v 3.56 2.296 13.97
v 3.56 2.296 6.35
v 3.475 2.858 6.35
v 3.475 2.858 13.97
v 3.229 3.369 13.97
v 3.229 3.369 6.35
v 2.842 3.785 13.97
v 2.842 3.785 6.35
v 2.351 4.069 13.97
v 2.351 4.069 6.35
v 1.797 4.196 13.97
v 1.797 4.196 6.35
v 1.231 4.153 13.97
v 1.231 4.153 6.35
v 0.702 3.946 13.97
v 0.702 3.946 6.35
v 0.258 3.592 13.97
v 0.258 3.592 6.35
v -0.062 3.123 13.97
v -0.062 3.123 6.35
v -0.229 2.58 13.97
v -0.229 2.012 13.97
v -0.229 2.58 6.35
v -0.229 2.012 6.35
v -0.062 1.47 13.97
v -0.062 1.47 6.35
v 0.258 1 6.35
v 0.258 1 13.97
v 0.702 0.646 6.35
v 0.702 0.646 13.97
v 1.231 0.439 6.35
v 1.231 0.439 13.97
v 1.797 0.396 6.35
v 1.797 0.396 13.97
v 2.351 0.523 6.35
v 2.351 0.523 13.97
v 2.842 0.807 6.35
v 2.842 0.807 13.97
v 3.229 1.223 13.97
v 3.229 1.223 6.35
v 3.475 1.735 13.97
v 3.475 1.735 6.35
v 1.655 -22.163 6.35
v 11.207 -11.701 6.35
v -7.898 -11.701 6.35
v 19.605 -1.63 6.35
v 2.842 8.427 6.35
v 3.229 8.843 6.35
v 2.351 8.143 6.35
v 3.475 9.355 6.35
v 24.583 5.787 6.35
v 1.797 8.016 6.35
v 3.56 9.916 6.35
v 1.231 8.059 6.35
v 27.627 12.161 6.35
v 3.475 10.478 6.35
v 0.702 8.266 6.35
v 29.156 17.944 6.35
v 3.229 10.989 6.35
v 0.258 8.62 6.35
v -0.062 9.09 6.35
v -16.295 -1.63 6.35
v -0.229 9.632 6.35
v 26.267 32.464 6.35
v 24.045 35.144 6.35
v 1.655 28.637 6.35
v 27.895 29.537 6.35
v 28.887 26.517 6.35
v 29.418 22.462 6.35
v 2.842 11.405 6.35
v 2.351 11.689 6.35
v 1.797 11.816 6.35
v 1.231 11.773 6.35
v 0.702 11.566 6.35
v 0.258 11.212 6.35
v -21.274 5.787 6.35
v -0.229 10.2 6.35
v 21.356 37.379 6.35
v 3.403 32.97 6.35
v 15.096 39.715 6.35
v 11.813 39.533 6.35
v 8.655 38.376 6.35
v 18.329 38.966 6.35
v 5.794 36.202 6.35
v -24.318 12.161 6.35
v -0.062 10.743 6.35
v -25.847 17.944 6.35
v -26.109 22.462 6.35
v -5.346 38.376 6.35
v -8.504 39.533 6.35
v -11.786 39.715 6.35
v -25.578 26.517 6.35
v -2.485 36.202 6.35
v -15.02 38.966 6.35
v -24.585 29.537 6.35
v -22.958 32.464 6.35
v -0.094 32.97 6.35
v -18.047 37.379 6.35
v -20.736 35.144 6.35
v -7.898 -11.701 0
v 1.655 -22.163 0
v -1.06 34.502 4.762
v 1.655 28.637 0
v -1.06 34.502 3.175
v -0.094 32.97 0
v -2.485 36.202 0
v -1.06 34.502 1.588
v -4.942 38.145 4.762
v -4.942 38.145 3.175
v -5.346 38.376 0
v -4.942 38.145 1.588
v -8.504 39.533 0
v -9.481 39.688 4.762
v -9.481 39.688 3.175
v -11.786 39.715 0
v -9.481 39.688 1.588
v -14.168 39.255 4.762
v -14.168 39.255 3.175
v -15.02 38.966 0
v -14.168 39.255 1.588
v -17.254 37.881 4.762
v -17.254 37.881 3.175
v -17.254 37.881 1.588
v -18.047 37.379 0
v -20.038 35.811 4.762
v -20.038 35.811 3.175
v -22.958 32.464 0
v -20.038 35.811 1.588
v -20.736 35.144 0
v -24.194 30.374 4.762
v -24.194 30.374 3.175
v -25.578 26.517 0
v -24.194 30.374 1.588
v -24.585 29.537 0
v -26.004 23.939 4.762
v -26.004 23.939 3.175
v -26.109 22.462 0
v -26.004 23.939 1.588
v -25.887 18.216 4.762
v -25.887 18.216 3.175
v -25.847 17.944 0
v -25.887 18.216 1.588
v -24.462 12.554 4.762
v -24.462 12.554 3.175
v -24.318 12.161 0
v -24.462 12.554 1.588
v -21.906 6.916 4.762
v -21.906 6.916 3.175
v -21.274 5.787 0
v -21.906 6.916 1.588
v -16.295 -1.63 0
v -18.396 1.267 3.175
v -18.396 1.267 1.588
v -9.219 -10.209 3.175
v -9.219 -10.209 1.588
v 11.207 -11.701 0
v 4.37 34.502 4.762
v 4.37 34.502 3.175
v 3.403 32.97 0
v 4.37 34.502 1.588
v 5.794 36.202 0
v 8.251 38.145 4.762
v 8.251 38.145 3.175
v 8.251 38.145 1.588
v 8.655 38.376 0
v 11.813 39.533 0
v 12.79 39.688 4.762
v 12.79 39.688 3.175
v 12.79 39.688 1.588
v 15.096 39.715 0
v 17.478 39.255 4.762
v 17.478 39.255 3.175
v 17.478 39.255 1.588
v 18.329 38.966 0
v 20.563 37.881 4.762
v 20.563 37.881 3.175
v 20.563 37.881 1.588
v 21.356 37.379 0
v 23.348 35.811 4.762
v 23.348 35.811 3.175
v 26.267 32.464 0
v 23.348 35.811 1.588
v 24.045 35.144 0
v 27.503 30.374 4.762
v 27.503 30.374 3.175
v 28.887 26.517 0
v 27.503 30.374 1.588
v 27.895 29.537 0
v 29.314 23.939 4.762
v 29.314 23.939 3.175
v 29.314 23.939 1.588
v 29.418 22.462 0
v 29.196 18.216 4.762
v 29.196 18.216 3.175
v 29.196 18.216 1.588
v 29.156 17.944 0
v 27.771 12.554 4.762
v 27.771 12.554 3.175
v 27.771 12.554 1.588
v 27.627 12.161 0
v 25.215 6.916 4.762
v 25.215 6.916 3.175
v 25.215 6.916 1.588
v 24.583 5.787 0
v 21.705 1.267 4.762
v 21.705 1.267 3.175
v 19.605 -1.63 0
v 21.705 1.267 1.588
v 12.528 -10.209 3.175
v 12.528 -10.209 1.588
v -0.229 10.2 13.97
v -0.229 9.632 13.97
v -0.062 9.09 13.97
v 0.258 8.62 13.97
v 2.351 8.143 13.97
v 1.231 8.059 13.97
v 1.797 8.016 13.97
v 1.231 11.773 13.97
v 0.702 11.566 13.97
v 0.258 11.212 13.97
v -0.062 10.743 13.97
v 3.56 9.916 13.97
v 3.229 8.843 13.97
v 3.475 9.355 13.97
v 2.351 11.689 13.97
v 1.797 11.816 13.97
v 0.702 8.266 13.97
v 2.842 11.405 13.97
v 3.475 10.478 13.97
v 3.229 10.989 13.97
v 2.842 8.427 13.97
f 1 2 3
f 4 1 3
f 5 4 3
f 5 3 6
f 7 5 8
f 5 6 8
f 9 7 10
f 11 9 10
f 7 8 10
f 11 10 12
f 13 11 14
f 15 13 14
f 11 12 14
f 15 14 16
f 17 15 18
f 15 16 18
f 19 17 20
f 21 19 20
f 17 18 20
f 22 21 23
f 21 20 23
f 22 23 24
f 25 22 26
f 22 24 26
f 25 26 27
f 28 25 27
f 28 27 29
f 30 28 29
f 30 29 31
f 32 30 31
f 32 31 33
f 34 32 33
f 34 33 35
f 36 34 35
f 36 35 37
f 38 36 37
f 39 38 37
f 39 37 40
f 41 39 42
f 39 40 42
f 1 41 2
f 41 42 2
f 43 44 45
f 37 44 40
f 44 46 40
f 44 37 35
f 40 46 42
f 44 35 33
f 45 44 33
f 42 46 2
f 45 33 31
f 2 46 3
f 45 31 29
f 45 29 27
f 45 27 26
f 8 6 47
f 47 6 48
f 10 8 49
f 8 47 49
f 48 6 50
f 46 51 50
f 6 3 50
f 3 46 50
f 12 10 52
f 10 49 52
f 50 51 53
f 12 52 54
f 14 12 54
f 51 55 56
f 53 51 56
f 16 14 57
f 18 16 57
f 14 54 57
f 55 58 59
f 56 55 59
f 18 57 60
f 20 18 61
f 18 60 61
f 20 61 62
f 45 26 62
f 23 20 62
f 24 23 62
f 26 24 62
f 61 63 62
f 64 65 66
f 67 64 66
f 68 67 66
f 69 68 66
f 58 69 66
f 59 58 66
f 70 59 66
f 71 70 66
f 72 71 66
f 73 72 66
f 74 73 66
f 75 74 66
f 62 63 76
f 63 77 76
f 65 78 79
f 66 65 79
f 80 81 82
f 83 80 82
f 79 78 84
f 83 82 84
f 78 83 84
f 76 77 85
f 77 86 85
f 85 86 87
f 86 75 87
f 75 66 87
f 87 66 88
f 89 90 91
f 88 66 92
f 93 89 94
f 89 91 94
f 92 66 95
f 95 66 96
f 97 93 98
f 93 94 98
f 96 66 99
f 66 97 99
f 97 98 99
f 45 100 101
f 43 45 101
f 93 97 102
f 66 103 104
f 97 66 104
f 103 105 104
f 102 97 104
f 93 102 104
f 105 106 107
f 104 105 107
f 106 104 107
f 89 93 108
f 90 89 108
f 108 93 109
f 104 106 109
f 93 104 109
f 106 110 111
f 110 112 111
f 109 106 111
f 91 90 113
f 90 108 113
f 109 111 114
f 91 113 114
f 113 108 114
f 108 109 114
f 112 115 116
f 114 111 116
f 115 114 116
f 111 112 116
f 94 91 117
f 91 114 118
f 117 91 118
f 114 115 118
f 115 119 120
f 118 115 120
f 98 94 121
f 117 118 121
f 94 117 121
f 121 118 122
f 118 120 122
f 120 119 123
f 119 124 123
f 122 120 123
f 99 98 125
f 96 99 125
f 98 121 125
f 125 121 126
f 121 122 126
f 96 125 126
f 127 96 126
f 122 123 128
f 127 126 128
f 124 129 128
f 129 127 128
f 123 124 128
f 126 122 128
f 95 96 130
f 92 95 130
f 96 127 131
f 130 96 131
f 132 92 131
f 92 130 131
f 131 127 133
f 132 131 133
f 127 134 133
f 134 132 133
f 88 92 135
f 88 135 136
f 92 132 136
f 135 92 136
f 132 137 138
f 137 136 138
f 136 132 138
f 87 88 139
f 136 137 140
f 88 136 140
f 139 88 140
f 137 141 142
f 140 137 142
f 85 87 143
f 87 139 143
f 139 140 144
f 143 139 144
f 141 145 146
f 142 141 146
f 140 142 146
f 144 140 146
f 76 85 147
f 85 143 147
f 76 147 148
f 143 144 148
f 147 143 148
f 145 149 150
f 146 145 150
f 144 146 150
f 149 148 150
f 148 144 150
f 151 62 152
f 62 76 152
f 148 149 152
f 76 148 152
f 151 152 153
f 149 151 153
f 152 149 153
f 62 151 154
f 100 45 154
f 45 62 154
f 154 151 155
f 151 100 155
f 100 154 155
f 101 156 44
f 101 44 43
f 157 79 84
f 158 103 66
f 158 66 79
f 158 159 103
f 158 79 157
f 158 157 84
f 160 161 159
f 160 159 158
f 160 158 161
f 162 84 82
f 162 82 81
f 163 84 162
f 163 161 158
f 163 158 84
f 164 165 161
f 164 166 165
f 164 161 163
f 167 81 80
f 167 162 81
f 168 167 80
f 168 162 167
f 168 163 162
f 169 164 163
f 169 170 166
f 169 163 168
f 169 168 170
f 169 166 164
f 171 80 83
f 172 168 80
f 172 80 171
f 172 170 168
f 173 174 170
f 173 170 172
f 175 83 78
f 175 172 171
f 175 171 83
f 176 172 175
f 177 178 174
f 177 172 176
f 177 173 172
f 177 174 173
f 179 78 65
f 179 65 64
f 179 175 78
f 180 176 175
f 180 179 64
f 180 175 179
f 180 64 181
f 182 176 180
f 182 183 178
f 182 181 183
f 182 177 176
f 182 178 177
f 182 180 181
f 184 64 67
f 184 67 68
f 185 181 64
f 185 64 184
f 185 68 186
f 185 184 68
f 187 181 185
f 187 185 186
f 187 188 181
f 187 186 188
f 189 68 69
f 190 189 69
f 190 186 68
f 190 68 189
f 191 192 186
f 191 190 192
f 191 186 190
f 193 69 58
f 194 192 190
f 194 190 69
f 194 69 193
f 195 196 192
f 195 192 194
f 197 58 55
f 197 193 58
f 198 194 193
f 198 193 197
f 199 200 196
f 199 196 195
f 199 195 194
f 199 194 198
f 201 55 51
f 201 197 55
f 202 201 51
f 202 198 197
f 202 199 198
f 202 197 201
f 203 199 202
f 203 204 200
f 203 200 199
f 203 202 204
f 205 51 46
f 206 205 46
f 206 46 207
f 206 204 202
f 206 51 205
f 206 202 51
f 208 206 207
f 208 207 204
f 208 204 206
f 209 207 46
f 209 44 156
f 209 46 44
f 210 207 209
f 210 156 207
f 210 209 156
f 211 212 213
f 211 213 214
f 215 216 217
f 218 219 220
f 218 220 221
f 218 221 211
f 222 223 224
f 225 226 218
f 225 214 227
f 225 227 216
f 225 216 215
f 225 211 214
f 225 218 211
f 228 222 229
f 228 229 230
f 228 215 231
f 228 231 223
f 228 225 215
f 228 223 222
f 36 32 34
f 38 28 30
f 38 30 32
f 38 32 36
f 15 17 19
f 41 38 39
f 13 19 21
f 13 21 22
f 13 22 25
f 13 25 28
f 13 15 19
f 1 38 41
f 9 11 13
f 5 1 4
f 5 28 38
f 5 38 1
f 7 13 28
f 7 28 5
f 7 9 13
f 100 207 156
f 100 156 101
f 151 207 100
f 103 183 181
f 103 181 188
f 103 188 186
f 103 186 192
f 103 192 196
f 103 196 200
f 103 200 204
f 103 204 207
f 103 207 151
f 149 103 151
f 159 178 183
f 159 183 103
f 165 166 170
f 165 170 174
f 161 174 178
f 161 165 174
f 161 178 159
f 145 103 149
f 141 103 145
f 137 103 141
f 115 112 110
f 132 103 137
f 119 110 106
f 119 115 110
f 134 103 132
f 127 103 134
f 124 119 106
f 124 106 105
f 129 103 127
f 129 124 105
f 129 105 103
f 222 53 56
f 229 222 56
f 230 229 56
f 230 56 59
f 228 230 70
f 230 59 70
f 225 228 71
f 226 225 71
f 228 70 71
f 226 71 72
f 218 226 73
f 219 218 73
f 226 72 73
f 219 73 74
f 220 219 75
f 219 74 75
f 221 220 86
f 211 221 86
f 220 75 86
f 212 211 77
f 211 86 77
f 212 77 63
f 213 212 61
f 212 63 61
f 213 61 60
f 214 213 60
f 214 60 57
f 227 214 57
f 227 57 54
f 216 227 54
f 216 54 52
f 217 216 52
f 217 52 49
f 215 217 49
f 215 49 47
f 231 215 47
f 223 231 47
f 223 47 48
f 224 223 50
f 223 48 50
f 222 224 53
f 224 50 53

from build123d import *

# Parameters (mm, degrees)
BOSS_EXTRUDE1_DEPTH = 6.35
SKETCH2_R           = 1.905
BOSS_EXTRUDE2_DEPTH = 7.62


with BuildPart() as part:
    # Sketch1 → Boss-Extrude1 (new body)
    with BuildSketch(Plane.XY):
        with BuildLine():
            add(Edge.make_bspline(
                [(1.654594255, 28.637086731), (4.270876616, 37.994619502), (16.280234659, 43.248904234), (27.555962484, 32.352353304), (32.898473868, 10.57833674), (16.656735718, -5.779122619), (1.654594255, -22.162913269)],
                knots=[0, 0, 0, 0, 0.212199078, 0.359774349, 0.438554441, 1, 1, 1, 1], degree=3))
            add(Edge.make_bspline(
                [(1.654594255, 28.637086731), (-0.961688106, 37.994619502), (-12.971046149, 43.248904234), (-24.246773974, 32.352353304), (-29.589285358, 10.57833674), (-13.347547209, -5.779122619), (1.654594255, -22.162913269)],
                knots=[0, 0, 0, 0, 0.212199078, 0.359774349, 0.438554441, 1, 1, 1, 1], degree=3))
        make_face()
    extrude(amount=BOSS_EXTRUDE1_DEPTH)

    # Sketch2 → Boss-Extrude2 (add)
    with BuildSketch(Plane.XY.offset(6.35)):
        with Locations((1.654594255, 9.916109637)):
            Circle(SKETCH2_R)
        with Locations((1.654594255, 2.296109637)):
            Circle(SKETCH2_R)
    extrude(amount=BOSS_EXTRUDE2_DEPTH)


solid = part.part
